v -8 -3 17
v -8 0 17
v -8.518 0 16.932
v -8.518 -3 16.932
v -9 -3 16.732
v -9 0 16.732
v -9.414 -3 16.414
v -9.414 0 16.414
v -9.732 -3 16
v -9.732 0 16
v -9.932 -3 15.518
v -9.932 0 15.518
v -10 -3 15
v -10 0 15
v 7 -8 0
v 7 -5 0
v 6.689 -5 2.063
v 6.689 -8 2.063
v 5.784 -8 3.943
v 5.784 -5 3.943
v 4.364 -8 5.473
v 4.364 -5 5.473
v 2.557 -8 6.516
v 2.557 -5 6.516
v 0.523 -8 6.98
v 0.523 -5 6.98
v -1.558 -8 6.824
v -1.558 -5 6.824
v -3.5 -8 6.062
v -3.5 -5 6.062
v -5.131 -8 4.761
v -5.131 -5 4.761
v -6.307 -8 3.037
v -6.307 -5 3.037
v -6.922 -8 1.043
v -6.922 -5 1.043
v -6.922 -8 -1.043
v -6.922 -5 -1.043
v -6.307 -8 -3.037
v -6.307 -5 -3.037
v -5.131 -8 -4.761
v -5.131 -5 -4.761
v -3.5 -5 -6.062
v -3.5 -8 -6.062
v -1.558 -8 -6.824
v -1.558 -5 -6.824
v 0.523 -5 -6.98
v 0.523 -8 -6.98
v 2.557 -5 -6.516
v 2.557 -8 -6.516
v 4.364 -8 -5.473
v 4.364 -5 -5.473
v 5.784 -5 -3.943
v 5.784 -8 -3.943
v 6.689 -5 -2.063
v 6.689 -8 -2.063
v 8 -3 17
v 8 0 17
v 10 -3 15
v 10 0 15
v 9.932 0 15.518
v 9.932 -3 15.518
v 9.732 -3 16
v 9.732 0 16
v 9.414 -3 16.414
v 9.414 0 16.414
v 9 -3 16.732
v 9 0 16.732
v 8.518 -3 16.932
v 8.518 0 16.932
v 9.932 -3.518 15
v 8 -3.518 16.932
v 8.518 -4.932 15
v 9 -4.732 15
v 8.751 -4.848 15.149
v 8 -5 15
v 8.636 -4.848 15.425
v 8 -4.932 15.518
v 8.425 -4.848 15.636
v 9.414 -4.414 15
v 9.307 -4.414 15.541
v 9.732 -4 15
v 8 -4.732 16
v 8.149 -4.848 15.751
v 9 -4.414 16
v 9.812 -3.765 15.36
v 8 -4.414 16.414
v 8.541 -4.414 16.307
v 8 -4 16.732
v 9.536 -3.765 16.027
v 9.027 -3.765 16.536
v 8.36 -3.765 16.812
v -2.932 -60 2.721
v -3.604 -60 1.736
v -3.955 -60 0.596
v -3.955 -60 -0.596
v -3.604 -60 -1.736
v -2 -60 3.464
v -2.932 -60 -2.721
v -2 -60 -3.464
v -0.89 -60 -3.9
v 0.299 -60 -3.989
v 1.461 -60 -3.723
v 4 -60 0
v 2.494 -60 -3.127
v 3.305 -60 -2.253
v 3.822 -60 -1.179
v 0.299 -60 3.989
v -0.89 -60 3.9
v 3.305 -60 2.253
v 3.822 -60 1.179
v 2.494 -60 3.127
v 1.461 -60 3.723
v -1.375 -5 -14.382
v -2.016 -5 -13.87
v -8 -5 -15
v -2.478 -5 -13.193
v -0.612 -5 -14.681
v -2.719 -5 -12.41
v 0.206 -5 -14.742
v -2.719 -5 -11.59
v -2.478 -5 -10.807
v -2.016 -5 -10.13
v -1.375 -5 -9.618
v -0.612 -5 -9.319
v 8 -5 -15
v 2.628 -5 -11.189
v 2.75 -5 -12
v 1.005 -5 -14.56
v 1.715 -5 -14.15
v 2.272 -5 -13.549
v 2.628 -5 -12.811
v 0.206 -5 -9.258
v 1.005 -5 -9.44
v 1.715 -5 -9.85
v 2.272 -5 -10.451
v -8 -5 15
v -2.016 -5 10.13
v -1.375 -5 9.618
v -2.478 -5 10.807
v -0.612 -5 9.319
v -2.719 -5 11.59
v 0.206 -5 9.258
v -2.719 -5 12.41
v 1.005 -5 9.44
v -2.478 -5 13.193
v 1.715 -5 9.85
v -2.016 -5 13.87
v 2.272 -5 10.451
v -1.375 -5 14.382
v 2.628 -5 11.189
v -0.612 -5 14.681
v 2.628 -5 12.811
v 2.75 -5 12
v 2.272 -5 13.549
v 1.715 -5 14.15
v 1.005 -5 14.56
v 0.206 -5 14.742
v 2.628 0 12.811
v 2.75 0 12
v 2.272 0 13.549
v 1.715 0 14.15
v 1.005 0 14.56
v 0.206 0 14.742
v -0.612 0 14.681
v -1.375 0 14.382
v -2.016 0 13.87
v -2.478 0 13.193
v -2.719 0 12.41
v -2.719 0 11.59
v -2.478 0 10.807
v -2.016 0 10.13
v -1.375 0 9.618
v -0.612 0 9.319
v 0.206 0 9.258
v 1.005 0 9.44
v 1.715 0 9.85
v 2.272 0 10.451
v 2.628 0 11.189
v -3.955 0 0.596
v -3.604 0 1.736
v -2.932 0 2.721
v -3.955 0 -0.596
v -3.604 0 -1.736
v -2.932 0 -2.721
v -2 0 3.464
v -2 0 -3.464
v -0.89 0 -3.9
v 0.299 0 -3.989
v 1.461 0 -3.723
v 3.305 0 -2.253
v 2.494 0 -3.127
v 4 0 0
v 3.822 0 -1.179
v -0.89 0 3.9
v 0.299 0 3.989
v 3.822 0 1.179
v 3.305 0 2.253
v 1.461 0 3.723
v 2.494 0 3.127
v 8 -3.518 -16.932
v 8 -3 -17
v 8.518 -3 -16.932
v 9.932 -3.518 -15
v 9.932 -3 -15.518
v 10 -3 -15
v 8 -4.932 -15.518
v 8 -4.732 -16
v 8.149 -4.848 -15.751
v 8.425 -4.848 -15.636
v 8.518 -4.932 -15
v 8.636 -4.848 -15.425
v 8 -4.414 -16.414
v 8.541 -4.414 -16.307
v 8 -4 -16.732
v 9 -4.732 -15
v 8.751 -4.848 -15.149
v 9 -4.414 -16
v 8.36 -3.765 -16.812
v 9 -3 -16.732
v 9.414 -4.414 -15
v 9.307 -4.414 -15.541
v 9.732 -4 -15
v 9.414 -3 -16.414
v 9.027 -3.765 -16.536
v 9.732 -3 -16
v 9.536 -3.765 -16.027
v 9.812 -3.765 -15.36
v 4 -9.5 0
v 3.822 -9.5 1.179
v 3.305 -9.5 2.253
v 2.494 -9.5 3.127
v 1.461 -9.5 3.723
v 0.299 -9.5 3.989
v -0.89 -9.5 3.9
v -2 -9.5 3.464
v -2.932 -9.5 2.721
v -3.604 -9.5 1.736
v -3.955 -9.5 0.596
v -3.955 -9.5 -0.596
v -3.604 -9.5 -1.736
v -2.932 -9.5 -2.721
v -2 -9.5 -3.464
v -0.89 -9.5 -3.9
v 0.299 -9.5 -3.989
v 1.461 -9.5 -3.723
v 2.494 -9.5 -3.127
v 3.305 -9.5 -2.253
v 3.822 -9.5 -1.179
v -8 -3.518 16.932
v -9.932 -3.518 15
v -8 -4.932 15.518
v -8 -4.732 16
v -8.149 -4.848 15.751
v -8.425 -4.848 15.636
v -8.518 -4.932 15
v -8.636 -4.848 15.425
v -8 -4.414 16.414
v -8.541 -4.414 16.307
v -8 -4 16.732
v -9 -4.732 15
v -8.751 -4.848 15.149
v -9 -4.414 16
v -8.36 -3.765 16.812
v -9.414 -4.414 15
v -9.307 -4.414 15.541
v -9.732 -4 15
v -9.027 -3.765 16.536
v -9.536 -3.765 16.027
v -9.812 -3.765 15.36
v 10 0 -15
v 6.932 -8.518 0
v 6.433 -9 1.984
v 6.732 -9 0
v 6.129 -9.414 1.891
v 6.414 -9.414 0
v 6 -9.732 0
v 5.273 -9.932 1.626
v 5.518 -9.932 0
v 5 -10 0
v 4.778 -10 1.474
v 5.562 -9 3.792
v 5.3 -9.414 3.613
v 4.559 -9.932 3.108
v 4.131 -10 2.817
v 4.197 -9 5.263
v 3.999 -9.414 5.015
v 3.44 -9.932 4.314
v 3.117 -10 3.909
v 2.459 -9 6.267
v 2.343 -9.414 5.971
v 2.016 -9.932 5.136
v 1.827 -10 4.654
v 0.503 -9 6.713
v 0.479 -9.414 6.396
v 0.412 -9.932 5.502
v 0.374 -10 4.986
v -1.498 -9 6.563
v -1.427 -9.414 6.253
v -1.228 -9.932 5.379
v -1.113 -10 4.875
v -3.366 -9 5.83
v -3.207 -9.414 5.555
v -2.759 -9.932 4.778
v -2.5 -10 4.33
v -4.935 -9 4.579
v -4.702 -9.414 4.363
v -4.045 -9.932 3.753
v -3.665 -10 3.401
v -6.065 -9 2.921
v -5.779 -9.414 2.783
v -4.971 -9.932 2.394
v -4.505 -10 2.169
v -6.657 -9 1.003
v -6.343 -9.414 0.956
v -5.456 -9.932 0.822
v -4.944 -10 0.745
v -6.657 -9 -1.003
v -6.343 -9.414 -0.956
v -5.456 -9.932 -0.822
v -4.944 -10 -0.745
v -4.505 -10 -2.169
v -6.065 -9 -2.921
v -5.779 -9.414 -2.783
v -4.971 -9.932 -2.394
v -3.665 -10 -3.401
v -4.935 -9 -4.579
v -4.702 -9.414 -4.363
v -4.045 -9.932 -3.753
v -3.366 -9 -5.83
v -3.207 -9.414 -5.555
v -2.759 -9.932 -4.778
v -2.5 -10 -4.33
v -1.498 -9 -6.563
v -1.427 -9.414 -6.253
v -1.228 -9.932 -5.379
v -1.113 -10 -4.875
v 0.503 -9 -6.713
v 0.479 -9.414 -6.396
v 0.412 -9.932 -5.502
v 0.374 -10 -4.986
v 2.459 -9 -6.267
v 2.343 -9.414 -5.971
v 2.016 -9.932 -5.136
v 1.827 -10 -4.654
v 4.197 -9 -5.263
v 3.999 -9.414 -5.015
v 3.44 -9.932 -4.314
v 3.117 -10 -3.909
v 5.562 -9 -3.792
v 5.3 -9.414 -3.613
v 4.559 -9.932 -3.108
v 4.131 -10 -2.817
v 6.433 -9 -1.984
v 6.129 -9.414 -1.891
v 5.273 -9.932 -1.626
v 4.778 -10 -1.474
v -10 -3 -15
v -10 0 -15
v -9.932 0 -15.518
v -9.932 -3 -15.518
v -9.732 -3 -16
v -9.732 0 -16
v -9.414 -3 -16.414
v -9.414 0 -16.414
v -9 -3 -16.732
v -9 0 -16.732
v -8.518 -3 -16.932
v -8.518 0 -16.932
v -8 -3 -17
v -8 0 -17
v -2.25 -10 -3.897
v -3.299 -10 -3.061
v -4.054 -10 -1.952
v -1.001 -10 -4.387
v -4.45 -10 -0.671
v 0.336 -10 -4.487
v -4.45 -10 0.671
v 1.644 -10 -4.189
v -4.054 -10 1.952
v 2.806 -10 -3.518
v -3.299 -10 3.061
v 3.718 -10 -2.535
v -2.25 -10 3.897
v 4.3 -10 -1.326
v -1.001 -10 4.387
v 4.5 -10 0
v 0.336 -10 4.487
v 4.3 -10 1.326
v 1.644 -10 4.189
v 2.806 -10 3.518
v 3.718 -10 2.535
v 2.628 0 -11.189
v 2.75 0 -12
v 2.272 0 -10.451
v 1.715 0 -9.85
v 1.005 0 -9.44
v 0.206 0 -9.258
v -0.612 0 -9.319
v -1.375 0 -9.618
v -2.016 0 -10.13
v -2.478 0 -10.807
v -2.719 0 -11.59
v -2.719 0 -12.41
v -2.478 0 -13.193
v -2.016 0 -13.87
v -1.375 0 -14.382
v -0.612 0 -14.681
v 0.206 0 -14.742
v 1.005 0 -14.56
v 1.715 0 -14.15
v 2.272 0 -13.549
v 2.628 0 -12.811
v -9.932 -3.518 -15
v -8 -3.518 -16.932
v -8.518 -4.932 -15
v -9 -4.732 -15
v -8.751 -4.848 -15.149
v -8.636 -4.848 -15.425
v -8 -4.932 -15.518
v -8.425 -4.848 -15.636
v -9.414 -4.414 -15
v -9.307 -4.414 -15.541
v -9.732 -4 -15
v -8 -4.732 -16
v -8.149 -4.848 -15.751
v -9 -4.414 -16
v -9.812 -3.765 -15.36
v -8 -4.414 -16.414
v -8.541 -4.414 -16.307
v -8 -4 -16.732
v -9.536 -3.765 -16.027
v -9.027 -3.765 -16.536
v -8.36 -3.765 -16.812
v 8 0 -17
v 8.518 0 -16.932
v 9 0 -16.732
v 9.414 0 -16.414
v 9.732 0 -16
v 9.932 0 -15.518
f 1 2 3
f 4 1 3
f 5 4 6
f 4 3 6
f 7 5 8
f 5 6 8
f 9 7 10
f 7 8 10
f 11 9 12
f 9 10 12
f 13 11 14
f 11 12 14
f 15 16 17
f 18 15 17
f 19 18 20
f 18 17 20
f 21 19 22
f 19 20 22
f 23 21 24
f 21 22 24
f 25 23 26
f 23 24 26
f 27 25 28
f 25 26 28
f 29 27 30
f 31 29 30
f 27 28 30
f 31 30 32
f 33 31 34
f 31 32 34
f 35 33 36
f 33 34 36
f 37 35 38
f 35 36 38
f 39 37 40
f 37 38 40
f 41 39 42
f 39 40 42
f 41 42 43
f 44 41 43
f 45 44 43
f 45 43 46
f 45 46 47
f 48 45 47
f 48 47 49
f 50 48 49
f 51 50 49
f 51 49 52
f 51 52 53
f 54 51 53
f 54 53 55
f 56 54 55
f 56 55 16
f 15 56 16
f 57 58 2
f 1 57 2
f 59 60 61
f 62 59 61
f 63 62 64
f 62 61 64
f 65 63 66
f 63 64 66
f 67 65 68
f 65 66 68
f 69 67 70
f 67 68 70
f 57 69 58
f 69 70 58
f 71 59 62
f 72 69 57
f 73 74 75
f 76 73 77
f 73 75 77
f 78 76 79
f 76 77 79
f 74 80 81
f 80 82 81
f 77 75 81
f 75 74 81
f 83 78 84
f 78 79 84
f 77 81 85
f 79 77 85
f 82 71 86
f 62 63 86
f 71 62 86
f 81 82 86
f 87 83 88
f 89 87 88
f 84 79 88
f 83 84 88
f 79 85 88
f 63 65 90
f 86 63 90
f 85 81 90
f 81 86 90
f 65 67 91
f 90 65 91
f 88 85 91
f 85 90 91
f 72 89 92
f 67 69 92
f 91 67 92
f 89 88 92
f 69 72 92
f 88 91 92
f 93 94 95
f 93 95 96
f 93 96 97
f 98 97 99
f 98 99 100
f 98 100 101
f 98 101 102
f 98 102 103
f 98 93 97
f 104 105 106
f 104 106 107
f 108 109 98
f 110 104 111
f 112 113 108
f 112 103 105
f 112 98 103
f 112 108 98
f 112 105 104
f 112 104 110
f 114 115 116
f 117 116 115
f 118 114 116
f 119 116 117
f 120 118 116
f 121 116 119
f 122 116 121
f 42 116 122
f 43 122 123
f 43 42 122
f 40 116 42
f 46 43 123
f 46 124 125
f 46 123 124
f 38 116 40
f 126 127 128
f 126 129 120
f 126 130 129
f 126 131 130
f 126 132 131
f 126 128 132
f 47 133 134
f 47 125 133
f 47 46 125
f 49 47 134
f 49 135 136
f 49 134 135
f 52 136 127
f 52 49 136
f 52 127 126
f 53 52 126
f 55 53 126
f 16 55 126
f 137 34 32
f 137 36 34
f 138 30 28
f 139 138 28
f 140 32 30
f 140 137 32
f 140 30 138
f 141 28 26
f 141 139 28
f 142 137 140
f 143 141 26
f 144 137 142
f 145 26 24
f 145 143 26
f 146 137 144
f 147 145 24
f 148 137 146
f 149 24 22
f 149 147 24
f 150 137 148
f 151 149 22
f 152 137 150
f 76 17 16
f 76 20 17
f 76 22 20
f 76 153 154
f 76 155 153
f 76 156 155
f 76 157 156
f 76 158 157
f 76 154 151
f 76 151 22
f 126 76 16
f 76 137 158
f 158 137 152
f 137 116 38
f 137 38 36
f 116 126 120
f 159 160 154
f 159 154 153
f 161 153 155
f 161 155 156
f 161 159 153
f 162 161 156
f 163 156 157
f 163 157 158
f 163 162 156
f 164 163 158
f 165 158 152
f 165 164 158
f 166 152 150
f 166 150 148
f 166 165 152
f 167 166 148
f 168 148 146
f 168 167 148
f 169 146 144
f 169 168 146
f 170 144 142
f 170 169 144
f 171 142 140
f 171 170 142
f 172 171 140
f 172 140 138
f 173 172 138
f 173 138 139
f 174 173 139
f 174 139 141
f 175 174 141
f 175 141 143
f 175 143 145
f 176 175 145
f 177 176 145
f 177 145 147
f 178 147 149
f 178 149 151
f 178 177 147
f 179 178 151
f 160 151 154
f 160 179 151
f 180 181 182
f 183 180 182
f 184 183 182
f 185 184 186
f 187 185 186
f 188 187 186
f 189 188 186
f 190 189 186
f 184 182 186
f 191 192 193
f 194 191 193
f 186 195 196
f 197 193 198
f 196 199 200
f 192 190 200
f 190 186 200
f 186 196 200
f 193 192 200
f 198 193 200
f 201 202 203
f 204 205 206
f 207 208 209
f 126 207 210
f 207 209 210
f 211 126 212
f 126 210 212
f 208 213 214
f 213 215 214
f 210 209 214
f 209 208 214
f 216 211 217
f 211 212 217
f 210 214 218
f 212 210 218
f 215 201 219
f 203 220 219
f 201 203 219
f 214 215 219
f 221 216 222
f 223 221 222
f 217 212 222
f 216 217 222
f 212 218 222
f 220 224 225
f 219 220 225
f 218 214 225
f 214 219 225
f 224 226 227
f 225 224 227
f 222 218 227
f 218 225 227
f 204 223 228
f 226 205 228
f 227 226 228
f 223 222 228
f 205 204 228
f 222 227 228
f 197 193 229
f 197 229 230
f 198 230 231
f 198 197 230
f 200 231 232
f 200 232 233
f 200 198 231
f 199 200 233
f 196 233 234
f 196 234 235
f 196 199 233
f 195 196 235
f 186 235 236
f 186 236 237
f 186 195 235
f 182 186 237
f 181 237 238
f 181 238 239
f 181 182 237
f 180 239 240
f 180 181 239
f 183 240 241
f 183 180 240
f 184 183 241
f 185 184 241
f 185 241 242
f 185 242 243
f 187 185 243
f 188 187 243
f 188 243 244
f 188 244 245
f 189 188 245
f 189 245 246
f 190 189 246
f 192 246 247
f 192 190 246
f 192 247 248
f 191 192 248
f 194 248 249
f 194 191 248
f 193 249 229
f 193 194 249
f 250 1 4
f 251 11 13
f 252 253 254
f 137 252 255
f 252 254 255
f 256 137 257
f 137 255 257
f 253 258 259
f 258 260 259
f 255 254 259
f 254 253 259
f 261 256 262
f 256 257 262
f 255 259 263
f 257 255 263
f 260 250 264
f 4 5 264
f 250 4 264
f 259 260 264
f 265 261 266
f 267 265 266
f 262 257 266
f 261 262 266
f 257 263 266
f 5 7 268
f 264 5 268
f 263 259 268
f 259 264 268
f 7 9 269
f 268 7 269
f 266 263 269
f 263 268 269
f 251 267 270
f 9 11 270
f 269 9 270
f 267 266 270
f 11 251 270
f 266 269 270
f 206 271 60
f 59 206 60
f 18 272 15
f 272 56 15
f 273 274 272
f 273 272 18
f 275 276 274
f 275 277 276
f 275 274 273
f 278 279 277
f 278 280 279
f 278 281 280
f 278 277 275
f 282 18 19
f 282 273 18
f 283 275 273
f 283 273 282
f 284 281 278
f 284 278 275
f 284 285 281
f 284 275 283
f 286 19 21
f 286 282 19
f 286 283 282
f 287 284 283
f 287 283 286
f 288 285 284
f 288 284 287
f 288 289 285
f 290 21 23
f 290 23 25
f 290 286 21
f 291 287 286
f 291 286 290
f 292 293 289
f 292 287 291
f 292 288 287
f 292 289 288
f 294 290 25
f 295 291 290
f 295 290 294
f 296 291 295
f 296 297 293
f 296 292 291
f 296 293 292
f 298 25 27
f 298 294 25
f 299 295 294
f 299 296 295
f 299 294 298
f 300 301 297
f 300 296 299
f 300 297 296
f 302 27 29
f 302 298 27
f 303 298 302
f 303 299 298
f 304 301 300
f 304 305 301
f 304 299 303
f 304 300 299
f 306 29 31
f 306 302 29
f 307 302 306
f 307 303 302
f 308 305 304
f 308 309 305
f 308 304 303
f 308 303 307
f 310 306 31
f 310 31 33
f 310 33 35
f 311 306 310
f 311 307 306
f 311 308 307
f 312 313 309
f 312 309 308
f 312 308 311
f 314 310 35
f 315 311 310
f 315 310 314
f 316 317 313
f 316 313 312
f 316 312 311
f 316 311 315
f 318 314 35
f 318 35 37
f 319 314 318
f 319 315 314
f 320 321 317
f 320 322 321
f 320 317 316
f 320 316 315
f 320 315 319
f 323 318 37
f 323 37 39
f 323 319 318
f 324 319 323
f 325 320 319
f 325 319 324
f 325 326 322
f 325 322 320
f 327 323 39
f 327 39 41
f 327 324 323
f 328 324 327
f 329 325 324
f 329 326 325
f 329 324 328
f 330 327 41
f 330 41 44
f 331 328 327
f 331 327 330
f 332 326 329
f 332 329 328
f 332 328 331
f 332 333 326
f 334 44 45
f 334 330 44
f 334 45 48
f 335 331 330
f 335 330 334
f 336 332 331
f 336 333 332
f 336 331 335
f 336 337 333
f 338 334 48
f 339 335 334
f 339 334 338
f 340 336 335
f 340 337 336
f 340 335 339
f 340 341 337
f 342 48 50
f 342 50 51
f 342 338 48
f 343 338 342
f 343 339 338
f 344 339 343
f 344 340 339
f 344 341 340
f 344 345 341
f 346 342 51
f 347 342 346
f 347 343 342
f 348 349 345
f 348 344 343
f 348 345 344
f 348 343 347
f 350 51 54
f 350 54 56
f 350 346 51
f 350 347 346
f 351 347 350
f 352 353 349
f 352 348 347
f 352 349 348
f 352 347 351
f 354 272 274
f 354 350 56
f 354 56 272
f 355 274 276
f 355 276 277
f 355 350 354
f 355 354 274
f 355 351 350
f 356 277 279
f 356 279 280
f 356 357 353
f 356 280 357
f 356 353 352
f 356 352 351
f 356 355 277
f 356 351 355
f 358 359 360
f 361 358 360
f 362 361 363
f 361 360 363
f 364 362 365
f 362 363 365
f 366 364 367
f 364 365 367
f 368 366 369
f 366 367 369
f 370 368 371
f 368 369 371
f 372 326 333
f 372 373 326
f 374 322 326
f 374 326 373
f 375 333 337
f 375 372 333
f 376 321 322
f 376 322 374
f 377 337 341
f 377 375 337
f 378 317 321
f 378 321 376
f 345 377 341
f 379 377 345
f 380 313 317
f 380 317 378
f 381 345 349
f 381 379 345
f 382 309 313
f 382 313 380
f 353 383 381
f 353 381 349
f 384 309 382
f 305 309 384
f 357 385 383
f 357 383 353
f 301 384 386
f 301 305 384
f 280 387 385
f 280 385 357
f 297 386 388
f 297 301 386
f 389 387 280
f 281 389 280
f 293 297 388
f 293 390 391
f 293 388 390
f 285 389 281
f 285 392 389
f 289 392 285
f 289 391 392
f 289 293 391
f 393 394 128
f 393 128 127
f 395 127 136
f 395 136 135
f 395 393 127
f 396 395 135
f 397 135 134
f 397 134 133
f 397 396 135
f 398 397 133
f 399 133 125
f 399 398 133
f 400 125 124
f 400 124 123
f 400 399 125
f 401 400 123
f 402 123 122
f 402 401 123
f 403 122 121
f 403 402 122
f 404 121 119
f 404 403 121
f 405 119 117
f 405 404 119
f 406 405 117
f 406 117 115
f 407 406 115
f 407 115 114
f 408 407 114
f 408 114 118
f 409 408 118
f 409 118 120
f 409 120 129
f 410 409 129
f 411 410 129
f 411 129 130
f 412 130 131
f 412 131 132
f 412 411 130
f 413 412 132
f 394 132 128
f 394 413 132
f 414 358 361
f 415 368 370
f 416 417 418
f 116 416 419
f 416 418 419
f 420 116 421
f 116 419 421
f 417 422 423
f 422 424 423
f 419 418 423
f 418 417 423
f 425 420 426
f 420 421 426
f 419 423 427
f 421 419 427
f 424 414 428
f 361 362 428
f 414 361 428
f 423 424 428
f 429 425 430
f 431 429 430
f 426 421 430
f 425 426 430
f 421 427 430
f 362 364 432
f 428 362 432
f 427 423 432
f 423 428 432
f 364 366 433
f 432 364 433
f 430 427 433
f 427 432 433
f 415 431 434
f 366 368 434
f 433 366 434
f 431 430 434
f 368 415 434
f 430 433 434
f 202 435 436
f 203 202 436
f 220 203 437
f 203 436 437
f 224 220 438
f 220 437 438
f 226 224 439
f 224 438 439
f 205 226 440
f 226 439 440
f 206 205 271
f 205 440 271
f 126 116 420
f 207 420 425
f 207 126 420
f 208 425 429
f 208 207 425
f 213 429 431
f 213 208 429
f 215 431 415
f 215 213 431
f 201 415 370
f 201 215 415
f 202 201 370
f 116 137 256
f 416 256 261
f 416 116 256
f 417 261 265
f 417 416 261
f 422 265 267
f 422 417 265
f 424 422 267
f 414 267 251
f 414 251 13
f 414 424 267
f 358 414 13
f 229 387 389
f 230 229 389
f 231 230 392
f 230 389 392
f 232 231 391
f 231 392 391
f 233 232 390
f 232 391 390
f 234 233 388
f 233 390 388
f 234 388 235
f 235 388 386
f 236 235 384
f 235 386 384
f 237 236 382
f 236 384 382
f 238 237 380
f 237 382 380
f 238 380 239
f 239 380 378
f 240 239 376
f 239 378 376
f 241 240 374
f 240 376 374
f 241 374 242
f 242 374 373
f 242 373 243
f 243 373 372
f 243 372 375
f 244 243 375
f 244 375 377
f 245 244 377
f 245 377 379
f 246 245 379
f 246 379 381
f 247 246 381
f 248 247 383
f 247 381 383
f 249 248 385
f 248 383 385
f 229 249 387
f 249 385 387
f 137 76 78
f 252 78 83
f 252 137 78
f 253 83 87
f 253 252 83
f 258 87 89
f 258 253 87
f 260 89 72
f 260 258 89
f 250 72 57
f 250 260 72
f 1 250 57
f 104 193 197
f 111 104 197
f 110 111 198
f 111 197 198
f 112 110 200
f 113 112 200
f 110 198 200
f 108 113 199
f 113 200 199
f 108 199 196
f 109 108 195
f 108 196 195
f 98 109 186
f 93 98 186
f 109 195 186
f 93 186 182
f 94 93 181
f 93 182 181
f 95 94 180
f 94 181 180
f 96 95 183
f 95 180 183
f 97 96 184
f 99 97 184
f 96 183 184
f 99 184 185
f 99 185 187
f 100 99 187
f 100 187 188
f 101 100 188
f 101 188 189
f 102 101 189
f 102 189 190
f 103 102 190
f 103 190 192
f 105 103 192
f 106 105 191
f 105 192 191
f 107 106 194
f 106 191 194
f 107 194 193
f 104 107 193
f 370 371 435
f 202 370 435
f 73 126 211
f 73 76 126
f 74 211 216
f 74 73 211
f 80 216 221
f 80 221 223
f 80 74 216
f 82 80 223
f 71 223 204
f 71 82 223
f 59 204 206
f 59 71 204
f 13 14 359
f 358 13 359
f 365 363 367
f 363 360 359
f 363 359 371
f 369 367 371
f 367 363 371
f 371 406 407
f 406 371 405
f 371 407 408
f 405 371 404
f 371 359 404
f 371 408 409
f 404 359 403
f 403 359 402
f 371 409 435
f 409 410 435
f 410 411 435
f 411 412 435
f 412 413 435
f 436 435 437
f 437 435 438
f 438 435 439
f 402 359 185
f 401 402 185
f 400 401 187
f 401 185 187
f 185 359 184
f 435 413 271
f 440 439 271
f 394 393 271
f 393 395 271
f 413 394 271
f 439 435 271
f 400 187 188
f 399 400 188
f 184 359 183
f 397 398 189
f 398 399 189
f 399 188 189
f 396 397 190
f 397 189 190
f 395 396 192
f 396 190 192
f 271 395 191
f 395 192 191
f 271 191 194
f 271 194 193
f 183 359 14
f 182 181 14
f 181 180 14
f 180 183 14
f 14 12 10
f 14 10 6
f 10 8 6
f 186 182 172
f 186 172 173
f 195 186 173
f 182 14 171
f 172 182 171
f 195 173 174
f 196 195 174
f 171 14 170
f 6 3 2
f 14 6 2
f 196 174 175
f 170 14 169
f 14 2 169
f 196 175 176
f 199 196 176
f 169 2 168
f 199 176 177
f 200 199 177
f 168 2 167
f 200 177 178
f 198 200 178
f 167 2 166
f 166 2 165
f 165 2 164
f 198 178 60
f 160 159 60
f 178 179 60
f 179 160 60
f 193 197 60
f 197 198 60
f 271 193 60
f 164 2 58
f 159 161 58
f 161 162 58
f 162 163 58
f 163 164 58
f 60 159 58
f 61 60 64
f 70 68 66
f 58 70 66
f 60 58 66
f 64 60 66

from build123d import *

# Parameters (mm, degrees)
F0_R     = 7
F0_R_2   = 4
F1_DEPTH = 10
F0_R_3   = 2.75
F2_DEPTH = 5
F3_DEPTH = 60
F4_R     = 2
F5_R     = 2
F6_SIZE  = 0.5


with BuildPart() as f1:
    # F0 (on Front) → F1 (new body)
    with BuildSketch(Plane.XZ):
        Circle(F0_R)
        Circle(F0_R_2, mode=Mode.SUBTRACT)
    extrude(amount=F1_DEPTH)

    # F0 (on Front) → F2 (join)
    with BuildSketch(Plane.XZ):
        with BuildLine():
            ThreePointArc((10, 15), (9.4142135624, 16.4142135624), (8, 17))
            Line((8, 17), (-8, 17))
            ThreePointArc((-8, 17), (-9.4142135624, 16.4142135624), (-10, 15))
            Line((-10, 15), (-10, -15))
            ThreePointArc((-10, -15), (-9.4142135624, -16.4142135624), (-8, -17))
            Line((-8, -17), (8, -17))
            ThreePointArc((8, -17), (9.4142135624, -16.4142135624), (10, -15))
            Line((10, -15), (10, 15))
        make_face()
        with Locations((0, -12)):
            Circle(F0_R_3, mode=Mode.SUBTRACT)
        Circle(F0_R, mode=Mode.SUBTRACT)
        with Locations((0, 12)):
            Circle(F0_R_3, mode=Mode.SUBTRACT)
    extrude(amount=F2_DEPTH)

    # F4
    f4_edges = [f1.edges().sort_by_distance(p)[0] for p in [
        (-7, -10, 0),
    ]]
    fillet(f4_edges, radius=F4_R)

    # F5
    f5_edges = [f1.edges().sort_by_distance(p)[0] for p in [
        (10, -5, 0),
    ]]
    fillet(f5_edges, radius=F5_R)

    # F6
    f6_edges = [f1.edges().sort_by_distance(p)[0] for p in [
        (-5, -10, 0),
        (-4, -10, 0),
    ]]
    chamfer(f6_edges, length=F6_SIZE)


with BuildPart() as f3:
    # F0 (on Front) → F3 (new body)
    with BuildSketch(Plane.XZ):
        Circle(F0_R_2)
    extrude(amount=F3_DEPTH)


solid = Compound([f1.part, f3.part])
